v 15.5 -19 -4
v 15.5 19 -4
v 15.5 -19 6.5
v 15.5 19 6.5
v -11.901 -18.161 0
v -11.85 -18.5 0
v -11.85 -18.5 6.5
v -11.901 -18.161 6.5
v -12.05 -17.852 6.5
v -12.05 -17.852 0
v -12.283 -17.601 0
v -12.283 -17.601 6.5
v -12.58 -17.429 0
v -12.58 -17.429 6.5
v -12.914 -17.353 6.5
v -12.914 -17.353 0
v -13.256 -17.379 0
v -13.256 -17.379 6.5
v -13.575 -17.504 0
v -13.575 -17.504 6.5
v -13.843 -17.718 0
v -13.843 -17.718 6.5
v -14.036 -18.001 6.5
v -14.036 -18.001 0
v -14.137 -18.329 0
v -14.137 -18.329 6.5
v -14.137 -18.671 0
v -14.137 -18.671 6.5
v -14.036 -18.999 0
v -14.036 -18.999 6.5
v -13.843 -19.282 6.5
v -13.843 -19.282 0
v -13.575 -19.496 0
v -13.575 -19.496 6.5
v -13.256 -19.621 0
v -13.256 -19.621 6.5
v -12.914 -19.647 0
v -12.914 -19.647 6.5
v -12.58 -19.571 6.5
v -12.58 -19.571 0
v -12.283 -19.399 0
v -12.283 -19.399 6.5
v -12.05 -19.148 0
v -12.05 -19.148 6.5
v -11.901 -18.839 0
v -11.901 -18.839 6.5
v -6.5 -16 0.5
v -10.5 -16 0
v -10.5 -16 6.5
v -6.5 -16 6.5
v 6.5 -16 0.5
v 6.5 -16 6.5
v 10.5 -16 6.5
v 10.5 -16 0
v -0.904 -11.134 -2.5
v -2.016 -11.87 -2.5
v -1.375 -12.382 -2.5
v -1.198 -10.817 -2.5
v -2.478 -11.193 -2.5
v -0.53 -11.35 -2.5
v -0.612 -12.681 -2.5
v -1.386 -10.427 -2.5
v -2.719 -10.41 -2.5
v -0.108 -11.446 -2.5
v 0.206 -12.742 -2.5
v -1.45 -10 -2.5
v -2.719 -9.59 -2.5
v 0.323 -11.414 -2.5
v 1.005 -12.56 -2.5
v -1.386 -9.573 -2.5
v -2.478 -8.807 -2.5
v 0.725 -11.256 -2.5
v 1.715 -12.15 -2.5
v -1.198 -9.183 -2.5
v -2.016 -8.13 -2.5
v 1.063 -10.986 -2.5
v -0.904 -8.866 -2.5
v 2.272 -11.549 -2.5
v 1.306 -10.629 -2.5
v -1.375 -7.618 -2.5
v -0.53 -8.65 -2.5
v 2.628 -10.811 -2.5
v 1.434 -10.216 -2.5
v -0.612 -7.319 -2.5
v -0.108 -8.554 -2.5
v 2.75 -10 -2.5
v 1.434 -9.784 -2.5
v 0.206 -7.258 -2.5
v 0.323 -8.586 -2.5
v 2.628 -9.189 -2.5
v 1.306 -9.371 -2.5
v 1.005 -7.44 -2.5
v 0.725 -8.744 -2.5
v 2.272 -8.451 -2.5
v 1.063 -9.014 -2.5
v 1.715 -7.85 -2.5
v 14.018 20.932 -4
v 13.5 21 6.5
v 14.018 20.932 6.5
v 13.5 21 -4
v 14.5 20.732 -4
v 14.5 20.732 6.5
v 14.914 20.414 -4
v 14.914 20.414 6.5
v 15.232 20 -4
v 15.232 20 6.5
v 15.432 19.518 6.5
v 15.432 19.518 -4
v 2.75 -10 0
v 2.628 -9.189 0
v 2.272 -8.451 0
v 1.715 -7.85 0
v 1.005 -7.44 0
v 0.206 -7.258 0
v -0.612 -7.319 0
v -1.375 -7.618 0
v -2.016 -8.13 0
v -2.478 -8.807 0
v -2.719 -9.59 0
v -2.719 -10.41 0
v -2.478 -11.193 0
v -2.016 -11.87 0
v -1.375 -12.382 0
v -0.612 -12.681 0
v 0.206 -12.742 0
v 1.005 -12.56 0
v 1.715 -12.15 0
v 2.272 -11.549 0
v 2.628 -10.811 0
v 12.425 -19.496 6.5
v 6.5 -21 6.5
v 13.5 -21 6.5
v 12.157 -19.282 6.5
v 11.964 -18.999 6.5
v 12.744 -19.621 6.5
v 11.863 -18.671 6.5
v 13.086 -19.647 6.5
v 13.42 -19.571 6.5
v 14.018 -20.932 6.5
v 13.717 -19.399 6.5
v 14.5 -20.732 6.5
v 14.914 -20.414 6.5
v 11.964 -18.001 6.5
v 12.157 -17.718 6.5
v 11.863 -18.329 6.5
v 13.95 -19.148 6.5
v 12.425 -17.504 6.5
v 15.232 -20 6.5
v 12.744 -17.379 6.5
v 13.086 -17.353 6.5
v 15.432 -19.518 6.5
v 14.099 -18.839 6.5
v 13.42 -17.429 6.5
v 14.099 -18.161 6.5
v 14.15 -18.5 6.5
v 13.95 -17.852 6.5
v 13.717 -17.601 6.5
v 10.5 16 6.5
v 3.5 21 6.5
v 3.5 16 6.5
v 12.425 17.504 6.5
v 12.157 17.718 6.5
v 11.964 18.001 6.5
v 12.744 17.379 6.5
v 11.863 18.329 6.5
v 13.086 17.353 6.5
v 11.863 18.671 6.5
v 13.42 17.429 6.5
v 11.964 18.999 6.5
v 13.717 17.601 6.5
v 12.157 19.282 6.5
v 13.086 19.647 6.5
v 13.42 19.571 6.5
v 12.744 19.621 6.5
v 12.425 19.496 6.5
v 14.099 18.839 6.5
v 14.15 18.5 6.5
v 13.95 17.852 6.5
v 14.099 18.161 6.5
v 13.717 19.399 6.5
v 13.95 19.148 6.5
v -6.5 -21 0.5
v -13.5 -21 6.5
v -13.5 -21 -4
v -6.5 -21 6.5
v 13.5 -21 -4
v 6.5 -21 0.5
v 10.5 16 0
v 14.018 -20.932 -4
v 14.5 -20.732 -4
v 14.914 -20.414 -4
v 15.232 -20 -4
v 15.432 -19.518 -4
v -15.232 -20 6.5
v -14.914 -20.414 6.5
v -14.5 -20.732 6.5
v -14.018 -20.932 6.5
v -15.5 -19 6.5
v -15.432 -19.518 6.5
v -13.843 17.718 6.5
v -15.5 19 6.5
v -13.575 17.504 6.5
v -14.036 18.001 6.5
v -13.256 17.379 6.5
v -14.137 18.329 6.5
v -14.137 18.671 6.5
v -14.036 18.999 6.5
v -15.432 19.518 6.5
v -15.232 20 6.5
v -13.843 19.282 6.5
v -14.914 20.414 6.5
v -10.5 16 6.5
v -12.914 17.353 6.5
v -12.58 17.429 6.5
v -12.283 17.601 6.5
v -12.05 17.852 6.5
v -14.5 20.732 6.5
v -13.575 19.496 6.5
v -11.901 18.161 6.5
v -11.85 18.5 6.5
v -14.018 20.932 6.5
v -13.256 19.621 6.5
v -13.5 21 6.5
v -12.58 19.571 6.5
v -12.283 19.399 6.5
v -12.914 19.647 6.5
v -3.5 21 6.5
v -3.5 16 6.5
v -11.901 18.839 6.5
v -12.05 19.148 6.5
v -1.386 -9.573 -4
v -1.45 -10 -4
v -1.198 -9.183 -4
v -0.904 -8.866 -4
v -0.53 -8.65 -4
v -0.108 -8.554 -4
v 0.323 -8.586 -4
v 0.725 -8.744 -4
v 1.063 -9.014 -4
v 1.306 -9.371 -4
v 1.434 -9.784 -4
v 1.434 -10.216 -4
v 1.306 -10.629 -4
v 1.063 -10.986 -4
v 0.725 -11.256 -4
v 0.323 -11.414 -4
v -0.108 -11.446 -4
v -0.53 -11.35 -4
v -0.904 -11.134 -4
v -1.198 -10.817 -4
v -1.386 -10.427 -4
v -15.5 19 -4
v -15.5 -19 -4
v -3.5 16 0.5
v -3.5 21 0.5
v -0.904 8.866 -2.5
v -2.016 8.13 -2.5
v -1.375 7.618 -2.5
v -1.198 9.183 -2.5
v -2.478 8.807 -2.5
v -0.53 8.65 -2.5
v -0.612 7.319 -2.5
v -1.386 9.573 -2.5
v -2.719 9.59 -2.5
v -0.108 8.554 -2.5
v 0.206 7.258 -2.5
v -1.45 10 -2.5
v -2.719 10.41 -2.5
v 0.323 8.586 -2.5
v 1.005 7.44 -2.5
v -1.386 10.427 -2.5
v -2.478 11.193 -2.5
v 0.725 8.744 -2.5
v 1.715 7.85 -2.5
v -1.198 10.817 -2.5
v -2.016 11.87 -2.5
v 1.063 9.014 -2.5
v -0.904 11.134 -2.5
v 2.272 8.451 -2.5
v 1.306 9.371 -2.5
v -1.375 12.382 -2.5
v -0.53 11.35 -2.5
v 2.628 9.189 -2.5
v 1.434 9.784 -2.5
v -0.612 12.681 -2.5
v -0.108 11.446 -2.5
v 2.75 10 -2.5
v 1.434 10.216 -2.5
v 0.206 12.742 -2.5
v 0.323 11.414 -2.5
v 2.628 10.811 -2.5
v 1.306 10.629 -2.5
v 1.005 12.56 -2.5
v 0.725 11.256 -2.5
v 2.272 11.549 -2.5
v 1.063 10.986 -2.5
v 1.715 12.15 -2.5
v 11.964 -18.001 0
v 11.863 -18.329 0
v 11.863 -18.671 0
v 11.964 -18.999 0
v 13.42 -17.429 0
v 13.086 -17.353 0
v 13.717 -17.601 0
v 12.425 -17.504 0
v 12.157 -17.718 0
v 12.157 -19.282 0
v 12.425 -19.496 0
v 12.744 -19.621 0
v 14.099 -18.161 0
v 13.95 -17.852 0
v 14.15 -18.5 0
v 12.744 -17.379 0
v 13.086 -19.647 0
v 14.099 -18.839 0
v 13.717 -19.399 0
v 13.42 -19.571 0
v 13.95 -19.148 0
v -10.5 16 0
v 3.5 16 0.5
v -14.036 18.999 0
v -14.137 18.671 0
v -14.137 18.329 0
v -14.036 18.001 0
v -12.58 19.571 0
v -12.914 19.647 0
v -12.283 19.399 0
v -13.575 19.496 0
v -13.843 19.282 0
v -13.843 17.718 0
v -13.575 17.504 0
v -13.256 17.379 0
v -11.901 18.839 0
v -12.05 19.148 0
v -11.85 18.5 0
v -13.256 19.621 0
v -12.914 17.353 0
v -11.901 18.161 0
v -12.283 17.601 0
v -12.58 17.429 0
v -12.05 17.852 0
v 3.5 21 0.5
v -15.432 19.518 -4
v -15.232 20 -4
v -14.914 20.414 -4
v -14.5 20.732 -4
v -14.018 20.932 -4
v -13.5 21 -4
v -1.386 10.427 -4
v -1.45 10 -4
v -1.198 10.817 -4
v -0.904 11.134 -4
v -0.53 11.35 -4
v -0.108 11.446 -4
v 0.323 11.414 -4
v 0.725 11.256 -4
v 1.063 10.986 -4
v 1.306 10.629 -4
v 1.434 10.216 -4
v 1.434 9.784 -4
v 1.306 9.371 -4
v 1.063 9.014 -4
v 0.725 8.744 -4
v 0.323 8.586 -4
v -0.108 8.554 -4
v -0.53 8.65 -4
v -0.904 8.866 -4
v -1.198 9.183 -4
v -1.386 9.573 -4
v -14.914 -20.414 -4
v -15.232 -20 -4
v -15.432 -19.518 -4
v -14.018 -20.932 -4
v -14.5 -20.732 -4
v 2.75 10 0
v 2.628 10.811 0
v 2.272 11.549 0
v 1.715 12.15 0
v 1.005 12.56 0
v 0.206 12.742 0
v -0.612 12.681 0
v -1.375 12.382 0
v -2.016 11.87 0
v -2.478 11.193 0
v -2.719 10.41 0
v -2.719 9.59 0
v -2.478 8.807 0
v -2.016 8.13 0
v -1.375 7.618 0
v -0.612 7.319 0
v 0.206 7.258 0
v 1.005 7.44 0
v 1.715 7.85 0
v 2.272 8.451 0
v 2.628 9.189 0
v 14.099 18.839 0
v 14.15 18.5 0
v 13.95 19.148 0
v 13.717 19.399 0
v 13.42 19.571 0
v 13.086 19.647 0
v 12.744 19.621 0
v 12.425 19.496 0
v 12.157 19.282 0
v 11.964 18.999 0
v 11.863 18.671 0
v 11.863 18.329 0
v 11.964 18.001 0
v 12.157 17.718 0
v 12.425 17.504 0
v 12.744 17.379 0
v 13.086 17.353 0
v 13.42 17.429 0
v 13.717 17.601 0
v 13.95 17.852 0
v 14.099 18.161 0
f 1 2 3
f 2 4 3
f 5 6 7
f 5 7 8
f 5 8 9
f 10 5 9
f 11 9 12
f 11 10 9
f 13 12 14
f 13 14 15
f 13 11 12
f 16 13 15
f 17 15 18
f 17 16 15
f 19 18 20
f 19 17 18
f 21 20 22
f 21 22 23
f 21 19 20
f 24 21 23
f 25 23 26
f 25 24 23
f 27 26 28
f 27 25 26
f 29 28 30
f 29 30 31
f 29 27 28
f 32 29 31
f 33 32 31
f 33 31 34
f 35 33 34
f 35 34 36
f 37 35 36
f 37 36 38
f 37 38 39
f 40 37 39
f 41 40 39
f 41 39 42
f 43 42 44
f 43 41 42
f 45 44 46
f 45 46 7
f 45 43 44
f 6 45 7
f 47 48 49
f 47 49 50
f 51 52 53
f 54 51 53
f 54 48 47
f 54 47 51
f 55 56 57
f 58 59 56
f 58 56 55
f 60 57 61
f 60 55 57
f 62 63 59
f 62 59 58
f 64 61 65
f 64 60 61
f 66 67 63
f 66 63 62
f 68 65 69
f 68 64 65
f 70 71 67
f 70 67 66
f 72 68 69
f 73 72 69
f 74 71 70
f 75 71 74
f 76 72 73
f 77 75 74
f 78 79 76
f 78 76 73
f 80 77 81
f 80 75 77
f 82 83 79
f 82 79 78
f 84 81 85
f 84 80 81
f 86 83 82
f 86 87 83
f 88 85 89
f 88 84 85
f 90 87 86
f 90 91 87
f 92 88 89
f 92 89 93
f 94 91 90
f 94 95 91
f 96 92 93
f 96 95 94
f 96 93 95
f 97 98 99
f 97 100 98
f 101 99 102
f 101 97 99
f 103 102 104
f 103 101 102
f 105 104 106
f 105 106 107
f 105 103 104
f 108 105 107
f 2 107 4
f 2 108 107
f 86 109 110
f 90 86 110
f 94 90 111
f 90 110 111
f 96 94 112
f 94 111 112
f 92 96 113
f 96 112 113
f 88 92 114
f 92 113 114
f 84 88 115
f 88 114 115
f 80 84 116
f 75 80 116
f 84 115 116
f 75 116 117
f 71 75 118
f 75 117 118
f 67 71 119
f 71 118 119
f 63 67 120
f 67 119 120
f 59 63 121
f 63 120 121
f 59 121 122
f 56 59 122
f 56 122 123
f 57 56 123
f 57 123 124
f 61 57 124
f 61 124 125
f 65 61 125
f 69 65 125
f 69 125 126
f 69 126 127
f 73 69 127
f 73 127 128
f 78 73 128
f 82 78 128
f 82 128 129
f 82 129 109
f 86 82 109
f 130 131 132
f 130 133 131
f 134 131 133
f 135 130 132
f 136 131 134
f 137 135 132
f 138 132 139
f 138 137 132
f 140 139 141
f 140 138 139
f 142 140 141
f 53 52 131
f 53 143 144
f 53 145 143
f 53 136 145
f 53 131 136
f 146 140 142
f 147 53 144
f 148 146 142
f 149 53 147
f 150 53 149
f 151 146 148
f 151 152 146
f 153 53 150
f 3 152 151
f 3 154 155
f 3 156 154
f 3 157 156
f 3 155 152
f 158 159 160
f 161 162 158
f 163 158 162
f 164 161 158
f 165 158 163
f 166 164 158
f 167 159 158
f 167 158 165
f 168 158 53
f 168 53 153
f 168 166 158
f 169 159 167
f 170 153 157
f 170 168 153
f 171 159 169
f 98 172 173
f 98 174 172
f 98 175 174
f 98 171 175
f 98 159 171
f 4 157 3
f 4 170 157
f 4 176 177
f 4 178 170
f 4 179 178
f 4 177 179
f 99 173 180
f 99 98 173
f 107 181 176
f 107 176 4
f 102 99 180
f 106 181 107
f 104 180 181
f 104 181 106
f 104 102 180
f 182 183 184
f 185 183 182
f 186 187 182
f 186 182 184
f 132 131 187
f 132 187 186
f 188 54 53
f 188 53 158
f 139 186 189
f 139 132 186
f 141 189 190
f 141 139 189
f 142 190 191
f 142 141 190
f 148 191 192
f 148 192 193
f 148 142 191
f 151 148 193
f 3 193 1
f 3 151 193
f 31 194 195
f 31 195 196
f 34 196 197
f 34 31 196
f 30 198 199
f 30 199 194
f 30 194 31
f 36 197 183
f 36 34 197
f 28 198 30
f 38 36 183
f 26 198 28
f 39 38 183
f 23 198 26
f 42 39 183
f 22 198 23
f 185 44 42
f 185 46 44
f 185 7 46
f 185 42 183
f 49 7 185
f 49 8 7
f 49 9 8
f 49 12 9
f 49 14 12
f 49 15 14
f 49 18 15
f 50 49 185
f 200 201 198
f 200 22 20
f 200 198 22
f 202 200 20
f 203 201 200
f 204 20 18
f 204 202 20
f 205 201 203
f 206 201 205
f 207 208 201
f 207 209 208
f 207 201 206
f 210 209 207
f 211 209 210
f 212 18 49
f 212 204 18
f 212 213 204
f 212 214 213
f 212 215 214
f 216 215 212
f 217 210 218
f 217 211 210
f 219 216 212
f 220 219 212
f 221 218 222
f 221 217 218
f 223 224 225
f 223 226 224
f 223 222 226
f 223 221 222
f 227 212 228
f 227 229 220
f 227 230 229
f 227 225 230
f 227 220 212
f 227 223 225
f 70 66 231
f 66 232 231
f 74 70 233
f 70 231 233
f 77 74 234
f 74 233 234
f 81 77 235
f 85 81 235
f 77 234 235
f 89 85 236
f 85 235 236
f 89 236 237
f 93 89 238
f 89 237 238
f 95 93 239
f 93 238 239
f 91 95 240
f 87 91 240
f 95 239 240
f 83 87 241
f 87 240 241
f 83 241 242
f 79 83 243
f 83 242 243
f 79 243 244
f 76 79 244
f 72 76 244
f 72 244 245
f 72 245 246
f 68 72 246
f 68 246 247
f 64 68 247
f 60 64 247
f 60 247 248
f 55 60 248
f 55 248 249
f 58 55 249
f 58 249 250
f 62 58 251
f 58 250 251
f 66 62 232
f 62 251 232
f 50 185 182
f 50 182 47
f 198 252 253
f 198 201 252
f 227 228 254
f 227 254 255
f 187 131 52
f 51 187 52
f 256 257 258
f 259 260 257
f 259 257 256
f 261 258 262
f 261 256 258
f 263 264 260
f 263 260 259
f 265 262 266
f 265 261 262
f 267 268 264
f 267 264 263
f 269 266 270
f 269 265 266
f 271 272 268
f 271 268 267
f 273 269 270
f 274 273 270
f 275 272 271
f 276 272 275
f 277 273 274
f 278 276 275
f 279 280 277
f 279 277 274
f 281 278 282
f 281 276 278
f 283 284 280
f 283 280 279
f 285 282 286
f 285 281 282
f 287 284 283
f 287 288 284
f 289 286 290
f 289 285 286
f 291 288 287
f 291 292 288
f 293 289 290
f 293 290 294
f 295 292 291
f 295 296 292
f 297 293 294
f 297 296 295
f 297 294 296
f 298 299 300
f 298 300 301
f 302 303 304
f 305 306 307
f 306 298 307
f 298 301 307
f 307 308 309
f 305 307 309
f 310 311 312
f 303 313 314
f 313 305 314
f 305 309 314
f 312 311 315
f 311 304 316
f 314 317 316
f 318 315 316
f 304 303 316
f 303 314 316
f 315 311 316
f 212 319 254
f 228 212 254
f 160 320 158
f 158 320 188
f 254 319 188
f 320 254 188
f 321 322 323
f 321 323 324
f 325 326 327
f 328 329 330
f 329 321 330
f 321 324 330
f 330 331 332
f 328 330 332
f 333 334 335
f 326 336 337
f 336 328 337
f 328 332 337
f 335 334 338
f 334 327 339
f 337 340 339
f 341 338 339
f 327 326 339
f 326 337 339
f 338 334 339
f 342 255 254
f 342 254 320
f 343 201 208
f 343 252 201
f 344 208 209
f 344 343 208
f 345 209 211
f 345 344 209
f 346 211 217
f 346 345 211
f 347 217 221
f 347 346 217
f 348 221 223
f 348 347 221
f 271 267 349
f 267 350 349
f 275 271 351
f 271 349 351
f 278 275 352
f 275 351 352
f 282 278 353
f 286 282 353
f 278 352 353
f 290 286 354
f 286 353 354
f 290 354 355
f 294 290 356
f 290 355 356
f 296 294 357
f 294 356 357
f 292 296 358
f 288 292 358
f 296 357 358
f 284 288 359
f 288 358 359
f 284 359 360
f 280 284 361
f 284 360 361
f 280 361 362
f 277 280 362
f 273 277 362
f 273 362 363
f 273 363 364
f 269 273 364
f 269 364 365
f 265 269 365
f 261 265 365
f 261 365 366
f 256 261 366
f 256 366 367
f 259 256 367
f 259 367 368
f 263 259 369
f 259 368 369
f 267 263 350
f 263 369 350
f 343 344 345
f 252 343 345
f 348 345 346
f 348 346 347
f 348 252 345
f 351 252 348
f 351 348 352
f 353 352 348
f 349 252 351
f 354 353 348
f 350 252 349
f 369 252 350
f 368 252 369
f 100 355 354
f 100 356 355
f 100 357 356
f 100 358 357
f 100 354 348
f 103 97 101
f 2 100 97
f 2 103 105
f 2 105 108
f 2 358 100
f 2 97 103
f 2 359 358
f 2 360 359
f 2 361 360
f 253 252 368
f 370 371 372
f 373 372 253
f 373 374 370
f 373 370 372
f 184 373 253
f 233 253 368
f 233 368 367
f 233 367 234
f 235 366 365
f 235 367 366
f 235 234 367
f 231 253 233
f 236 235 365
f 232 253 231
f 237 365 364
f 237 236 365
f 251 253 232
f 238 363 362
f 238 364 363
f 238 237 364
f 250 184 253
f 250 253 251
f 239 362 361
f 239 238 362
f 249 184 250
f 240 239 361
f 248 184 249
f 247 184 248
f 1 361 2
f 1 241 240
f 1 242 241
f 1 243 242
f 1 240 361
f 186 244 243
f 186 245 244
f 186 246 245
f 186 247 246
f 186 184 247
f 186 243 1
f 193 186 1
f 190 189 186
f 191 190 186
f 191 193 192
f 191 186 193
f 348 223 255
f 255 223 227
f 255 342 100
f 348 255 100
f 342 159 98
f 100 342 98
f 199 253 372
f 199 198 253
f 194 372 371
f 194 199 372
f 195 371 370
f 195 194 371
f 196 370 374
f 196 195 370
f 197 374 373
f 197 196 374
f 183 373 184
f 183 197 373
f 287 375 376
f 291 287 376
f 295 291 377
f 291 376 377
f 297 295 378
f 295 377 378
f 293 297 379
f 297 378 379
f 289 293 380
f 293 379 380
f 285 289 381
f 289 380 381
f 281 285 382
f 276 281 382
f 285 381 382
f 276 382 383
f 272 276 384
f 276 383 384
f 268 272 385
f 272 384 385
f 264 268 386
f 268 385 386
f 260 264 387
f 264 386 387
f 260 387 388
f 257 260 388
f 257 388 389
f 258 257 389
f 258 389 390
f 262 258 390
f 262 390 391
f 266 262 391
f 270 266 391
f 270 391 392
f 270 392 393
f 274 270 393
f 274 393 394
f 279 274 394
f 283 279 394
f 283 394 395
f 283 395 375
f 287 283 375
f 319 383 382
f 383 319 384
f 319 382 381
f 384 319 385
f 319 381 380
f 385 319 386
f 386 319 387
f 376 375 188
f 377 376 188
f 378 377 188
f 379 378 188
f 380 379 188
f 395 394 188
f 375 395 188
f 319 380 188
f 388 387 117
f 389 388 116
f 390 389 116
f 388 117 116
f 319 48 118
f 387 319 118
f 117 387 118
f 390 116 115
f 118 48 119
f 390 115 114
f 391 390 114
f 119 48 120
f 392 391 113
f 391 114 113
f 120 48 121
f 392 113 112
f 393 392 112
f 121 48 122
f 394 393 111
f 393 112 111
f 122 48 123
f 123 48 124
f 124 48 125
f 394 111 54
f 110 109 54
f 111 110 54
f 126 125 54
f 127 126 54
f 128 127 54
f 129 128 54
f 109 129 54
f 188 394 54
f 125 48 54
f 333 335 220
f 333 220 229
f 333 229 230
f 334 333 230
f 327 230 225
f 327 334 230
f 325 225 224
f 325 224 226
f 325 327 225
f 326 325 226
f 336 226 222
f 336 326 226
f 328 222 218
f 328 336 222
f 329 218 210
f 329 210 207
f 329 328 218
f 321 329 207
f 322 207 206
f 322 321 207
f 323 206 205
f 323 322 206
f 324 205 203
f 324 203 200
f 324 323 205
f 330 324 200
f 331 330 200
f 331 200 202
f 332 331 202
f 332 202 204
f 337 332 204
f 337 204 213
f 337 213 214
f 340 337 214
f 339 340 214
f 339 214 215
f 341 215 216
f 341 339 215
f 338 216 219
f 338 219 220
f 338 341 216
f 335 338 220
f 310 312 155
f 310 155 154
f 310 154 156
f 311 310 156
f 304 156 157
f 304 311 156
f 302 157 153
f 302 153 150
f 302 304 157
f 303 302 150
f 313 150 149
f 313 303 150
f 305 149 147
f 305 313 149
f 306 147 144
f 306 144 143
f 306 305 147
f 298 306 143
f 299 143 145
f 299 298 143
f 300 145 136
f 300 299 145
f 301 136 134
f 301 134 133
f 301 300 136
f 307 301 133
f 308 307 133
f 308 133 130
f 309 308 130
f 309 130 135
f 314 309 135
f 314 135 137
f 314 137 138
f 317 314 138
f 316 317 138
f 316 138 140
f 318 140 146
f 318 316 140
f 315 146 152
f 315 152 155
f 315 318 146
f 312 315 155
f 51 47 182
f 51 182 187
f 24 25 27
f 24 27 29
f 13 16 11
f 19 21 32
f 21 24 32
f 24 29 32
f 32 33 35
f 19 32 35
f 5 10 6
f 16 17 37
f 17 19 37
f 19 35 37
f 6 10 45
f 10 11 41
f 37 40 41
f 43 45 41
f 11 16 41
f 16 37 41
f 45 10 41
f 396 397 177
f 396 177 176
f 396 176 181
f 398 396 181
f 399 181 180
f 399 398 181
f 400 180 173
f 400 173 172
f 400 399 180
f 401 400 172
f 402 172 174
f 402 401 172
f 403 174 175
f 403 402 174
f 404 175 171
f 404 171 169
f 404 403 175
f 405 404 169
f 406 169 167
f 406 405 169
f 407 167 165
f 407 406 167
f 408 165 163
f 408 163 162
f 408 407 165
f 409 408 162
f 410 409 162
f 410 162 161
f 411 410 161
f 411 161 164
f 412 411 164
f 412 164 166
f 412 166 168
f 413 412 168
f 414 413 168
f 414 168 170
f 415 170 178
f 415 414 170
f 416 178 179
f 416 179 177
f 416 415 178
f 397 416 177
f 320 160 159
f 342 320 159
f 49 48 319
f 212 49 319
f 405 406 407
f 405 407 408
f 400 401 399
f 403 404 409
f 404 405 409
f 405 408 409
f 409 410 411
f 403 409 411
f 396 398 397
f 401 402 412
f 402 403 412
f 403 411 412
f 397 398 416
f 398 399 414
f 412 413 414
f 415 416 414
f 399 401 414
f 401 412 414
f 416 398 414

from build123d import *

# Parameters (mm, degrees)
F0_W           = 31
F0_H           = 42
F0_R           = 1.15
F0_W_2         = 21
F0_H_2         = 32
F1_DEPTH       = 6.5
F2_W           = 31
F2_H           = 42
F2_R           = 1.15
F2_W_2         = 21
F2_H_2         = 32
F3_DEPTH       = 4
F4_W           = 13
F4_H           = 5
F4_W_2         = 7
F5_DEPTH       = 6
F6_R           = 2
F8_D           = 2.9
F8_CBORE_D     = 5.5
F8_CBORE_DEPTH = 2.5


with BuildPart() as f1:
    # F0 (on Top) → F1 (new body)
    with BuildSketch(Plane.XY):
        Rectangle(F0_W, F0_H)
        with Locations((-13, -18.5)):
            Circle(F0_R, mode=Mode.SUBTRACT)
        with Locations((13, -18.5)):
            Circle(F0_R, mode=Mode.SUBTRACT)
        with Locations((-13, 18.5)):
            Circle(F0_R, mode=Mode.SUBTRACT)
        Rectangle(F0_W_2, F0_H_2, mode=Mode.SUBTRACT)
        with Locations((13, 18.5)):
            Circle(F0_R, mode=Mode.SUBTRACT)
    extrude(amount=F1_DEPTH)

    # F2 (on face) → F3 (join)
    with BuildSketch(Plane(origin=(0, 0, 0), x_dir=(1, 0, 0), z_dir=(0, 0, -1))):
        Rectangle(F2_W, F2_H)
        with Locations((-13, -18.5)):
            Circle(F2_R, mode=Mode.SUBTRACT)
        with Locations((13, -18.5)):
            Circle(F2_R, mode=Mode.SUBTRACT)
        with Locations((-13, 18.5)):
            Circle(F2_R, mode=Mode.SUBTRACT)
        Rectangle(F2_W_2, F2_H_2, mode=Mode.SUBTRACT)
        with Locations((13, 18.5)):
            Circle(F2_R, mode=Mode.SUBTRACT)
        with Locations((-13, 18.5)):
            Circle(F2_R)
        with Locations((13, 18.5)):
            Circle(F2_R)
        with Locations((-13, -18.5)):
            Circle(F2_R)
        Rectangle(F2_W_2, F2_H_2)
        with Locations((13, -18.5)):
            Circle(F2_R)
    extrude(amount=F3_DEPTH)

    # F4 (on face) → F5 (cut)
    with BuildSketch(Plane.XY.offset(6.5)):
        with Locations((0, -18.5)):
            Rectangle(F4_W, F4_H)
        with Locations((0, 18.5)):
            Rectangle(F4_W_2, F4_H)
    extrude(amount=-F5_DEPTH, mode=Mode.SUBTRACT)

    # F6
    f6_edges = [f1.edges().sort_by_distance(p)[0] for p in [
        (-15.5, 21, 1.25),
        (15.5, 21, 1.25),
        (15.5, -21, 1.25),
        (-15.5, -21, 1.25),
    ]]
    fillet(f6_edges, radius=F6_R)

    # F8 (through all)
    with Locations(Plane.XY):
        with Locations((0, 10), (0, -10)):
            CounterBoreHole(F8_D / 2, F8_CBORE_D / 2, F8_CBORE_DEPTH)


solid = f1.part
